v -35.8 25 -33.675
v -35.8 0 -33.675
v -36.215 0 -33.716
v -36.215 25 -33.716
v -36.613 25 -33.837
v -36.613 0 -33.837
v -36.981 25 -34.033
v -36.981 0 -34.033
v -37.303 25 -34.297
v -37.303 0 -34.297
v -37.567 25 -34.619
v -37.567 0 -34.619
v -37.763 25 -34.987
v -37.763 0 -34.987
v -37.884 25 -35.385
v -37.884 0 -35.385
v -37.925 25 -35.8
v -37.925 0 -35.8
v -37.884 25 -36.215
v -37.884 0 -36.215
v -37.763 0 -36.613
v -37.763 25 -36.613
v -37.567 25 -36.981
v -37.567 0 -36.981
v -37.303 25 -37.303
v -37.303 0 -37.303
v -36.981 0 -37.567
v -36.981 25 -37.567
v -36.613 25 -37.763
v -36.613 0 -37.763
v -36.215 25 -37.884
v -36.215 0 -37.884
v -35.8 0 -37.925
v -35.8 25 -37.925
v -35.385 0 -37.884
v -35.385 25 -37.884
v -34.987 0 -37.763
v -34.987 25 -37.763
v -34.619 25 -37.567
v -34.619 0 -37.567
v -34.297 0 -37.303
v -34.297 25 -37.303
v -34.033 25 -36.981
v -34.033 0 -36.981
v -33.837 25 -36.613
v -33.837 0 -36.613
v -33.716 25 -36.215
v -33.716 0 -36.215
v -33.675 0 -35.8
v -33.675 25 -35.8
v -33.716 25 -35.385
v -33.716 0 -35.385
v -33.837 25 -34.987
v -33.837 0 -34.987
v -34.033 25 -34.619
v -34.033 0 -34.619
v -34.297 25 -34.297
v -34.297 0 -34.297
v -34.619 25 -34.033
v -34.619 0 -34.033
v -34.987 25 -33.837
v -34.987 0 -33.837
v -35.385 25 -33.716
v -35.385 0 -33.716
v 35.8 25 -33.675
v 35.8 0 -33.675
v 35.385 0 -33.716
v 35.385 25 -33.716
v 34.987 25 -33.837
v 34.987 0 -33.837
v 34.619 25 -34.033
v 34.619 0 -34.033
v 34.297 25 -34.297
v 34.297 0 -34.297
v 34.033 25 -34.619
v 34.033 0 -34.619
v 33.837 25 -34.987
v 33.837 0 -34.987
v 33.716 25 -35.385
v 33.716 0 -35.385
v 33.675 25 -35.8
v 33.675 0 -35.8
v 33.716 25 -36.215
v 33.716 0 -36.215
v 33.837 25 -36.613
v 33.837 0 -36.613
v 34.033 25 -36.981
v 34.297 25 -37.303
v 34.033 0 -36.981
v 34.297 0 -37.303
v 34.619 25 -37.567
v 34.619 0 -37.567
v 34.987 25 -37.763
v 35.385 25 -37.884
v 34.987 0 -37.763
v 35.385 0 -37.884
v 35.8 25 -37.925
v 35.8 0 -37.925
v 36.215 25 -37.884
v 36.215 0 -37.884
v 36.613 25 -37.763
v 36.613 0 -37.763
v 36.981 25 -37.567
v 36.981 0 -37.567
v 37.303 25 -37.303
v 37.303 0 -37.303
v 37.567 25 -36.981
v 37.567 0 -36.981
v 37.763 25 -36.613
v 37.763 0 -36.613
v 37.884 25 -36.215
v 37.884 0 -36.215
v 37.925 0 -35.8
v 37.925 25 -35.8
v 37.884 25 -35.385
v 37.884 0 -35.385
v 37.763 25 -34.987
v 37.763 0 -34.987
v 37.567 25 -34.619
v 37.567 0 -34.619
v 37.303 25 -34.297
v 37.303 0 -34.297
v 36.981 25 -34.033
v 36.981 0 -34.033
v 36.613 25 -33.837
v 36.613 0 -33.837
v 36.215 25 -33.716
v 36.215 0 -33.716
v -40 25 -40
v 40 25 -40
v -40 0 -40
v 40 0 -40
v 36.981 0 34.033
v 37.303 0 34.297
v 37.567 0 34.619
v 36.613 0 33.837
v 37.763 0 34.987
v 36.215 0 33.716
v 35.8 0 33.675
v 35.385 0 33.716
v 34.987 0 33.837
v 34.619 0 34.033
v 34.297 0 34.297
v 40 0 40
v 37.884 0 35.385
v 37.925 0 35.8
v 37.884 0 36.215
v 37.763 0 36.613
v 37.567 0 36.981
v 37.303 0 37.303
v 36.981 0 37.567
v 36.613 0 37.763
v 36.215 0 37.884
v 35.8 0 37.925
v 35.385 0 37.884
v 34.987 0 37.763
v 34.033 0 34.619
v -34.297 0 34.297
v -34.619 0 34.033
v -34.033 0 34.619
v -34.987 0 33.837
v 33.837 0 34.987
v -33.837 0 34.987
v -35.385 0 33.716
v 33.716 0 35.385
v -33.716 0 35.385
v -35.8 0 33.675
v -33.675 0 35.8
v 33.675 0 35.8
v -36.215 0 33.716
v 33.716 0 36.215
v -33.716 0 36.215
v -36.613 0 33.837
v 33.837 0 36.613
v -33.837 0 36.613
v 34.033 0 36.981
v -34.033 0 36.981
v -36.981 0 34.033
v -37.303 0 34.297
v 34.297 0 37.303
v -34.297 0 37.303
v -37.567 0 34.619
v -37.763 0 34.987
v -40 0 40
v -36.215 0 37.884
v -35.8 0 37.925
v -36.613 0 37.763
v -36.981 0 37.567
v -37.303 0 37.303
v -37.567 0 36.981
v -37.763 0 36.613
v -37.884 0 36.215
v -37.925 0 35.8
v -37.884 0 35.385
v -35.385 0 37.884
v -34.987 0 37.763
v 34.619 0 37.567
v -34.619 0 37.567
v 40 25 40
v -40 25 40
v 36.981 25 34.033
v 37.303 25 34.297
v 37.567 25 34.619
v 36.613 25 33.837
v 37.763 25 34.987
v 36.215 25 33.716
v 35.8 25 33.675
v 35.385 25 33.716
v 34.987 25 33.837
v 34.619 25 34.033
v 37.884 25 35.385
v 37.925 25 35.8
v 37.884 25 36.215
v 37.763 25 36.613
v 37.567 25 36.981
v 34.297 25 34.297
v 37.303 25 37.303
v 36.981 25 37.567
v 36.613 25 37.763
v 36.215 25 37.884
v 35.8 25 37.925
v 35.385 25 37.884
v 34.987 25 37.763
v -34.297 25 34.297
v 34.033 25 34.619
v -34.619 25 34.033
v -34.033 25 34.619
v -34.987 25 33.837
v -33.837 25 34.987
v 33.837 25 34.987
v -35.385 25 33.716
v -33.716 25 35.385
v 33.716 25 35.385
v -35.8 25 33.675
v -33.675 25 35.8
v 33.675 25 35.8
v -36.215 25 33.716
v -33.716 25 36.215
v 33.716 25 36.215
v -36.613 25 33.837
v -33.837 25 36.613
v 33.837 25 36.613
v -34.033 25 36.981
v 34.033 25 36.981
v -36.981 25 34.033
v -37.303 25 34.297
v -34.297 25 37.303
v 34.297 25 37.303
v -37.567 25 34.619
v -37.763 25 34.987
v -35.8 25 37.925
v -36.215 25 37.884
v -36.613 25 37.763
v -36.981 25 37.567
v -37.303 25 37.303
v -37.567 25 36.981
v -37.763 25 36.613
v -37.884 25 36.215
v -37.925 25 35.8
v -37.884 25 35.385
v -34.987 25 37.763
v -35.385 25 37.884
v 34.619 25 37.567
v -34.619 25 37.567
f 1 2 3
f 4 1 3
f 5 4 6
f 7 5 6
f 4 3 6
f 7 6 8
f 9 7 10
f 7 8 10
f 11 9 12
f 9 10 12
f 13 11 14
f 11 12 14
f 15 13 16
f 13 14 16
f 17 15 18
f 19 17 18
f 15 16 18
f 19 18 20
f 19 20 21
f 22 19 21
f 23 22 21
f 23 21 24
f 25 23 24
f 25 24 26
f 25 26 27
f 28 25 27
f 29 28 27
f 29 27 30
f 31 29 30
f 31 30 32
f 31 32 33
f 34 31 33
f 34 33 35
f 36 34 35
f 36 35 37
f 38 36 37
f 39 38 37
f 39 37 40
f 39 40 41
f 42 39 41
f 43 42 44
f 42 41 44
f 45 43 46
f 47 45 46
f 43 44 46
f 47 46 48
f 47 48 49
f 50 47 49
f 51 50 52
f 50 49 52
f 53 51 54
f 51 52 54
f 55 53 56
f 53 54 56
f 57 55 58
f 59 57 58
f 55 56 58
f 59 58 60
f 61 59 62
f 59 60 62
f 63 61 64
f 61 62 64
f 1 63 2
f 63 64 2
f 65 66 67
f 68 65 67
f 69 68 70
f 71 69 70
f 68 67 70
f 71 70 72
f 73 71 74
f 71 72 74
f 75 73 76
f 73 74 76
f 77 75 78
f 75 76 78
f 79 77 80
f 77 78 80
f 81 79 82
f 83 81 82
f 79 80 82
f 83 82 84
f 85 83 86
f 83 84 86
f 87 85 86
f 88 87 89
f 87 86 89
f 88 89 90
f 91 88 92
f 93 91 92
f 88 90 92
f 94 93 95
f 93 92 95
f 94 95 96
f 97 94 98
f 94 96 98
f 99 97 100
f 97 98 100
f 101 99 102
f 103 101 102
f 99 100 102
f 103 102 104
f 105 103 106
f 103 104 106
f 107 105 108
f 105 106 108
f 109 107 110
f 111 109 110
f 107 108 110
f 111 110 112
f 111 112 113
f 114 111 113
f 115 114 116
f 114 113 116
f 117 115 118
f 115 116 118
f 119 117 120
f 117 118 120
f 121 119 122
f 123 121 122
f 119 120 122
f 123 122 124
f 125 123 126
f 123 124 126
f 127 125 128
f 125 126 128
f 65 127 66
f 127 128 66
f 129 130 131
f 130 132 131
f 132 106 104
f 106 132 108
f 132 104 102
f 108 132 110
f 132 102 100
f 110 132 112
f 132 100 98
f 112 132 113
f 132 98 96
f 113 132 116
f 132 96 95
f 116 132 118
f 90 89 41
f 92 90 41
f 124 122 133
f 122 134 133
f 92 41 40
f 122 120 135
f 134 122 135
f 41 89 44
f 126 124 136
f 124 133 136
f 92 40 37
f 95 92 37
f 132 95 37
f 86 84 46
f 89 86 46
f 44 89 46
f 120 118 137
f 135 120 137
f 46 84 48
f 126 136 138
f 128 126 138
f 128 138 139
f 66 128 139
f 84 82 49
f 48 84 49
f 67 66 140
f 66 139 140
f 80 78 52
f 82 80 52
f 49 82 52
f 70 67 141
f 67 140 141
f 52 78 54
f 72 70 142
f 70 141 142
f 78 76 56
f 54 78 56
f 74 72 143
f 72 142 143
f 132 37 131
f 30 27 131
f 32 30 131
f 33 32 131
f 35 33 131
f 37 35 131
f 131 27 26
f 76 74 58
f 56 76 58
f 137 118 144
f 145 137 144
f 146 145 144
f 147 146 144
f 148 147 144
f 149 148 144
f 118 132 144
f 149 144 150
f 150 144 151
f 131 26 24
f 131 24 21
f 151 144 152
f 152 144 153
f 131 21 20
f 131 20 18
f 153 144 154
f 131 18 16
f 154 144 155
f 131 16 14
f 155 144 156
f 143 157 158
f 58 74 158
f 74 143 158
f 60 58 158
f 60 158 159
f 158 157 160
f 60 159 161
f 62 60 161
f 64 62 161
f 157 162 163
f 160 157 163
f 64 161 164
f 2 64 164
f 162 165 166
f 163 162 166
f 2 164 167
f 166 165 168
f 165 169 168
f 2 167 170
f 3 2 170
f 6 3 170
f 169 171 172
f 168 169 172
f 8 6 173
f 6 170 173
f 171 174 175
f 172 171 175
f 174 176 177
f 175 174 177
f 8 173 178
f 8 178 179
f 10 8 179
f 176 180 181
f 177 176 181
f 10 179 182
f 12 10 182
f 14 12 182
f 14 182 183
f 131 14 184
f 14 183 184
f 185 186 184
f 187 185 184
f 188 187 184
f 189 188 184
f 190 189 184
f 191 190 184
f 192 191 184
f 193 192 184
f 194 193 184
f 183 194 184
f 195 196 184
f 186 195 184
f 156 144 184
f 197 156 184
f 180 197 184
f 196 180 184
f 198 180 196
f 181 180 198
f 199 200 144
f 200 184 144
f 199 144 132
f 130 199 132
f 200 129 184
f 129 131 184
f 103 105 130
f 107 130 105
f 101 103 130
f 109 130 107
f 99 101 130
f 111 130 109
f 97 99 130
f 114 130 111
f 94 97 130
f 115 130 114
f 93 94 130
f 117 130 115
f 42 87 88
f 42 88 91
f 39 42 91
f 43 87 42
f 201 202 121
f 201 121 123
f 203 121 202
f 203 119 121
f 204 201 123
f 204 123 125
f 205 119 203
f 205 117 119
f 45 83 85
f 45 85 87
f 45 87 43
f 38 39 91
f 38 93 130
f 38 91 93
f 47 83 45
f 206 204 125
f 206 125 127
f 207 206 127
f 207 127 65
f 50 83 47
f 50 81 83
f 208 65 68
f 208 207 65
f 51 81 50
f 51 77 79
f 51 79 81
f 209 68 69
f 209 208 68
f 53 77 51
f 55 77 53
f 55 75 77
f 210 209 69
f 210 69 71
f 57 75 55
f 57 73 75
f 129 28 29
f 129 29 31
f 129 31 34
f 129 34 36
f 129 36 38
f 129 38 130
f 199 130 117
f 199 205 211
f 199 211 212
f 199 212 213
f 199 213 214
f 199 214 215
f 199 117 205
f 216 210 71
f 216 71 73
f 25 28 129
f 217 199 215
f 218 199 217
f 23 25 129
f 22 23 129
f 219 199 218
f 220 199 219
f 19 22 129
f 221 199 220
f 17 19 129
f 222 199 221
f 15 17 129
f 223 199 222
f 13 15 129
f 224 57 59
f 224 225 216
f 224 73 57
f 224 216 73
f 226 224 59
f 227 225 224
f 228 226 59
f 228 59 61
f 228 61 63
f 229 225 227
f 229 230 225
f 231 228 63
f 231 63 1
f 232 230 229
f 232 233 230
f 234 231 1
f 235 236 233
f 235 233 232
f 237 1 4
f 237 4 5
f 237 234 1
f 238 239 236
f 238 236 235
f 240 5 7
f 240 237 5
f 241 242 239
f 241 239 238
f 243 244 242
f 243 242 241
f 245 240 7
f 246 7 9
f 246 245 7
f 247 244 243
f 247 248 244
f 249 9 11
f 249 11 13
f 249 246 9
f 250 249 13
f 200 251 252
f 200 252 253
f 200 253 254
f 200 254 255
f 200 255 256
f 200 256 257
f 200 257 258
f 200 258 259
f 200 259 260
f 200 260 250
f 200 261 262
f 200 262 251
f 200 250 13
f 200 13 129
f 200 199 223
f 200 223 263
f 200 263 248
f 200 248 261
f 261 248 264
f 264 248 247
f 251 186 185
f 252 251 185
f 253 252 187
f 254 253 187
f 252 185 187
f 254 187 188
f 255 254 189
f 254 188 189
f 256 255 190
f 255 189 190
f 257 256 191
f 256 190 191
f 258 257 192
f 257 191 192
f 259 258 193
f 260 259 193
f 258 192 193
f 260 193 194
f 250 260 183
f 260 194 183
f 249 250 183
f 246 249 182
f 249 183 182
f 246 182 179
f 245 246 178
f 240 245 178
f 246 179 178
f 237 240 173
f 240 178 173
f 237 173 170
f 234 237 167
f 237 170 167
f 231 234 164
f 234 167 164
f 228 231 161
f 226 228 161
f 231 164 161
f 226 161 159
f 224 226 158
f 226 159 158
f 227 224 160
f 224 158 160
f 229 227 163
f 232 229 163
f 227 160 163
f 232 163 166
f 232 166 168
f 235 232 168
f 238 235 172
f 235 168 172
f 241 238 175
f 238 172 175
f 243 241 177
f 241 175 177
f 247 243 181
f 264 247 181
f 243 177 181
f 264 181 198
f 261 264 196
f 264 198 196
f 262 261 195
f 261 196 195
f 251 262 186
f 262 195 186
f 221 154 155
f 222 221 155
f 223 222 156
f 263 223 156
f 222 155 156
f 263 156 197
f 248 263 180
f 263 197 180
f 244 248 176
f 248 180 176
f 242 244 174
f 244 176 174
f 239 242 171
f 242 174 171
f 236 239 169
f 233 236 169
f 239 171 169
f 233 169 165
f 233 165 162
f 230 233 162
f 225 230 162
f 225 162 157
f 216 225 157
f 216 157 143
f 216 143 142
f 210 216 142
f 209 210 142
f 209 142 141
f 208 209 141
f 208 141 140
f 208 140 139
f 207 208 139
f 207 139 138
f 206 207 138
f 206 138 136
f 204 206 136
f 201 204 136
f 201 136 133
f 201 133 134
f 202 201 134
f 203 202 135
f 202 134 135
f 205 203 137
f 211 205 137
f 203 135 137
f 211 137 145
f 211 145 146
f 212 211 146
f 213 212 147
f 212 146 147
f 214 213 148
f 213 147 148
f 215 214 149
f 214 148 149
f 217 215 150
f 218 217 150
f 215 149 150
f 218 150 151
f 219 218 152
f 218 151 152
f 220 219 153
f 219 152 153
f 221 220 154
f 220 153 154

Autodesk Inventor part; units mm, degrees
ref_plane "YZ Plane" through (0, 0, 0) normal (1, 0, 0) x (0, 1, 0)
ref_plane "XZ Plane" through (0, 0, 0) normal (0, 1, 0) x (-1, 0, 0)
ref_plane "XY Plane" through (0, 0, 0) normal (0, 0, 1) x (1, 0, 0)
sketch "Boceto1" plane through (0, 0, 0) normal (0, 1, 0) x (-1, 0, 0)
  line L0 (-40, -40) -> (40, -40)
  line L1 (40, -40) -> (40, 40)
  line L2 (40, 40) -> (-40, 40)
  line L3 (-40, 40) -> (-40, -40)
  line L4 (-40, -40) -> (40, 40) construction
  line L5 (40, -40) -> (-40, 40) construction
  point P0 (0, 0)
  dimension "d0" = 80
  dimension "d1" = 80
extrude "Extrusión1" add sketch "Boceto1" along normal blind 25
sketch "Boceto2" plane through (0, 25, 0) normal (0, 1, 0) x (1, 0, 0)
  line L0 (-40, -40) -> (40, -40) projected
  line L1 (40, -40) -> (40, 40) projected
  circle A0 centre (35.8, -35.8) radius 2.1
  line L2 (40, 40) -> (35.8, 40)
  line L3 (40, 40) -> (-40, 40) projected
  line L4 (35.8, 40) -> (40, 40)
  line L5 (-40, 40) -> (-40, -40) projected
  line L6 (-40, 40) -> (-35.8, 40)
  line L7 (-35.8, 40) -> (-35.8, 35.8)
  line L8 (-40, -40) -> (-35.8, -40)
  line L9 (-35.8, -40) -> (-35.8, -35.8)
  circle A1 centre (-35.8, -35.8) radius 2.1
  circle A2 centre (-35.8, 35.8) radius 2.1
  line L10 (35.8, 40) -> (35.8, 35.8)
  circle A3 centre (35.8, 35.8) radius 2.1
  point P0 (0, 0)
  dimension "d15" = 4.2
  dimension "d16" = 4.2
  dimension "d17" = 4.2
  dimension "d18" = 4.2
  dimension "d19" = 4.2
  dimension "d20" = 4.2
  dimension "d21" = 4.2
  dimension "d22" = 4.2
  dimension "d23" = 4.2
  dimension "d24" = 4.2
hole "Agujero1" at (35.8, 25, 35.8) at (35.8, 25, -35.8) at (-35.8, 25, -35.8) at (-35.8, 25, 35.8) direction (0, -1, 0) diameter 4.25 depth 30
properties part number "Ventilador"
